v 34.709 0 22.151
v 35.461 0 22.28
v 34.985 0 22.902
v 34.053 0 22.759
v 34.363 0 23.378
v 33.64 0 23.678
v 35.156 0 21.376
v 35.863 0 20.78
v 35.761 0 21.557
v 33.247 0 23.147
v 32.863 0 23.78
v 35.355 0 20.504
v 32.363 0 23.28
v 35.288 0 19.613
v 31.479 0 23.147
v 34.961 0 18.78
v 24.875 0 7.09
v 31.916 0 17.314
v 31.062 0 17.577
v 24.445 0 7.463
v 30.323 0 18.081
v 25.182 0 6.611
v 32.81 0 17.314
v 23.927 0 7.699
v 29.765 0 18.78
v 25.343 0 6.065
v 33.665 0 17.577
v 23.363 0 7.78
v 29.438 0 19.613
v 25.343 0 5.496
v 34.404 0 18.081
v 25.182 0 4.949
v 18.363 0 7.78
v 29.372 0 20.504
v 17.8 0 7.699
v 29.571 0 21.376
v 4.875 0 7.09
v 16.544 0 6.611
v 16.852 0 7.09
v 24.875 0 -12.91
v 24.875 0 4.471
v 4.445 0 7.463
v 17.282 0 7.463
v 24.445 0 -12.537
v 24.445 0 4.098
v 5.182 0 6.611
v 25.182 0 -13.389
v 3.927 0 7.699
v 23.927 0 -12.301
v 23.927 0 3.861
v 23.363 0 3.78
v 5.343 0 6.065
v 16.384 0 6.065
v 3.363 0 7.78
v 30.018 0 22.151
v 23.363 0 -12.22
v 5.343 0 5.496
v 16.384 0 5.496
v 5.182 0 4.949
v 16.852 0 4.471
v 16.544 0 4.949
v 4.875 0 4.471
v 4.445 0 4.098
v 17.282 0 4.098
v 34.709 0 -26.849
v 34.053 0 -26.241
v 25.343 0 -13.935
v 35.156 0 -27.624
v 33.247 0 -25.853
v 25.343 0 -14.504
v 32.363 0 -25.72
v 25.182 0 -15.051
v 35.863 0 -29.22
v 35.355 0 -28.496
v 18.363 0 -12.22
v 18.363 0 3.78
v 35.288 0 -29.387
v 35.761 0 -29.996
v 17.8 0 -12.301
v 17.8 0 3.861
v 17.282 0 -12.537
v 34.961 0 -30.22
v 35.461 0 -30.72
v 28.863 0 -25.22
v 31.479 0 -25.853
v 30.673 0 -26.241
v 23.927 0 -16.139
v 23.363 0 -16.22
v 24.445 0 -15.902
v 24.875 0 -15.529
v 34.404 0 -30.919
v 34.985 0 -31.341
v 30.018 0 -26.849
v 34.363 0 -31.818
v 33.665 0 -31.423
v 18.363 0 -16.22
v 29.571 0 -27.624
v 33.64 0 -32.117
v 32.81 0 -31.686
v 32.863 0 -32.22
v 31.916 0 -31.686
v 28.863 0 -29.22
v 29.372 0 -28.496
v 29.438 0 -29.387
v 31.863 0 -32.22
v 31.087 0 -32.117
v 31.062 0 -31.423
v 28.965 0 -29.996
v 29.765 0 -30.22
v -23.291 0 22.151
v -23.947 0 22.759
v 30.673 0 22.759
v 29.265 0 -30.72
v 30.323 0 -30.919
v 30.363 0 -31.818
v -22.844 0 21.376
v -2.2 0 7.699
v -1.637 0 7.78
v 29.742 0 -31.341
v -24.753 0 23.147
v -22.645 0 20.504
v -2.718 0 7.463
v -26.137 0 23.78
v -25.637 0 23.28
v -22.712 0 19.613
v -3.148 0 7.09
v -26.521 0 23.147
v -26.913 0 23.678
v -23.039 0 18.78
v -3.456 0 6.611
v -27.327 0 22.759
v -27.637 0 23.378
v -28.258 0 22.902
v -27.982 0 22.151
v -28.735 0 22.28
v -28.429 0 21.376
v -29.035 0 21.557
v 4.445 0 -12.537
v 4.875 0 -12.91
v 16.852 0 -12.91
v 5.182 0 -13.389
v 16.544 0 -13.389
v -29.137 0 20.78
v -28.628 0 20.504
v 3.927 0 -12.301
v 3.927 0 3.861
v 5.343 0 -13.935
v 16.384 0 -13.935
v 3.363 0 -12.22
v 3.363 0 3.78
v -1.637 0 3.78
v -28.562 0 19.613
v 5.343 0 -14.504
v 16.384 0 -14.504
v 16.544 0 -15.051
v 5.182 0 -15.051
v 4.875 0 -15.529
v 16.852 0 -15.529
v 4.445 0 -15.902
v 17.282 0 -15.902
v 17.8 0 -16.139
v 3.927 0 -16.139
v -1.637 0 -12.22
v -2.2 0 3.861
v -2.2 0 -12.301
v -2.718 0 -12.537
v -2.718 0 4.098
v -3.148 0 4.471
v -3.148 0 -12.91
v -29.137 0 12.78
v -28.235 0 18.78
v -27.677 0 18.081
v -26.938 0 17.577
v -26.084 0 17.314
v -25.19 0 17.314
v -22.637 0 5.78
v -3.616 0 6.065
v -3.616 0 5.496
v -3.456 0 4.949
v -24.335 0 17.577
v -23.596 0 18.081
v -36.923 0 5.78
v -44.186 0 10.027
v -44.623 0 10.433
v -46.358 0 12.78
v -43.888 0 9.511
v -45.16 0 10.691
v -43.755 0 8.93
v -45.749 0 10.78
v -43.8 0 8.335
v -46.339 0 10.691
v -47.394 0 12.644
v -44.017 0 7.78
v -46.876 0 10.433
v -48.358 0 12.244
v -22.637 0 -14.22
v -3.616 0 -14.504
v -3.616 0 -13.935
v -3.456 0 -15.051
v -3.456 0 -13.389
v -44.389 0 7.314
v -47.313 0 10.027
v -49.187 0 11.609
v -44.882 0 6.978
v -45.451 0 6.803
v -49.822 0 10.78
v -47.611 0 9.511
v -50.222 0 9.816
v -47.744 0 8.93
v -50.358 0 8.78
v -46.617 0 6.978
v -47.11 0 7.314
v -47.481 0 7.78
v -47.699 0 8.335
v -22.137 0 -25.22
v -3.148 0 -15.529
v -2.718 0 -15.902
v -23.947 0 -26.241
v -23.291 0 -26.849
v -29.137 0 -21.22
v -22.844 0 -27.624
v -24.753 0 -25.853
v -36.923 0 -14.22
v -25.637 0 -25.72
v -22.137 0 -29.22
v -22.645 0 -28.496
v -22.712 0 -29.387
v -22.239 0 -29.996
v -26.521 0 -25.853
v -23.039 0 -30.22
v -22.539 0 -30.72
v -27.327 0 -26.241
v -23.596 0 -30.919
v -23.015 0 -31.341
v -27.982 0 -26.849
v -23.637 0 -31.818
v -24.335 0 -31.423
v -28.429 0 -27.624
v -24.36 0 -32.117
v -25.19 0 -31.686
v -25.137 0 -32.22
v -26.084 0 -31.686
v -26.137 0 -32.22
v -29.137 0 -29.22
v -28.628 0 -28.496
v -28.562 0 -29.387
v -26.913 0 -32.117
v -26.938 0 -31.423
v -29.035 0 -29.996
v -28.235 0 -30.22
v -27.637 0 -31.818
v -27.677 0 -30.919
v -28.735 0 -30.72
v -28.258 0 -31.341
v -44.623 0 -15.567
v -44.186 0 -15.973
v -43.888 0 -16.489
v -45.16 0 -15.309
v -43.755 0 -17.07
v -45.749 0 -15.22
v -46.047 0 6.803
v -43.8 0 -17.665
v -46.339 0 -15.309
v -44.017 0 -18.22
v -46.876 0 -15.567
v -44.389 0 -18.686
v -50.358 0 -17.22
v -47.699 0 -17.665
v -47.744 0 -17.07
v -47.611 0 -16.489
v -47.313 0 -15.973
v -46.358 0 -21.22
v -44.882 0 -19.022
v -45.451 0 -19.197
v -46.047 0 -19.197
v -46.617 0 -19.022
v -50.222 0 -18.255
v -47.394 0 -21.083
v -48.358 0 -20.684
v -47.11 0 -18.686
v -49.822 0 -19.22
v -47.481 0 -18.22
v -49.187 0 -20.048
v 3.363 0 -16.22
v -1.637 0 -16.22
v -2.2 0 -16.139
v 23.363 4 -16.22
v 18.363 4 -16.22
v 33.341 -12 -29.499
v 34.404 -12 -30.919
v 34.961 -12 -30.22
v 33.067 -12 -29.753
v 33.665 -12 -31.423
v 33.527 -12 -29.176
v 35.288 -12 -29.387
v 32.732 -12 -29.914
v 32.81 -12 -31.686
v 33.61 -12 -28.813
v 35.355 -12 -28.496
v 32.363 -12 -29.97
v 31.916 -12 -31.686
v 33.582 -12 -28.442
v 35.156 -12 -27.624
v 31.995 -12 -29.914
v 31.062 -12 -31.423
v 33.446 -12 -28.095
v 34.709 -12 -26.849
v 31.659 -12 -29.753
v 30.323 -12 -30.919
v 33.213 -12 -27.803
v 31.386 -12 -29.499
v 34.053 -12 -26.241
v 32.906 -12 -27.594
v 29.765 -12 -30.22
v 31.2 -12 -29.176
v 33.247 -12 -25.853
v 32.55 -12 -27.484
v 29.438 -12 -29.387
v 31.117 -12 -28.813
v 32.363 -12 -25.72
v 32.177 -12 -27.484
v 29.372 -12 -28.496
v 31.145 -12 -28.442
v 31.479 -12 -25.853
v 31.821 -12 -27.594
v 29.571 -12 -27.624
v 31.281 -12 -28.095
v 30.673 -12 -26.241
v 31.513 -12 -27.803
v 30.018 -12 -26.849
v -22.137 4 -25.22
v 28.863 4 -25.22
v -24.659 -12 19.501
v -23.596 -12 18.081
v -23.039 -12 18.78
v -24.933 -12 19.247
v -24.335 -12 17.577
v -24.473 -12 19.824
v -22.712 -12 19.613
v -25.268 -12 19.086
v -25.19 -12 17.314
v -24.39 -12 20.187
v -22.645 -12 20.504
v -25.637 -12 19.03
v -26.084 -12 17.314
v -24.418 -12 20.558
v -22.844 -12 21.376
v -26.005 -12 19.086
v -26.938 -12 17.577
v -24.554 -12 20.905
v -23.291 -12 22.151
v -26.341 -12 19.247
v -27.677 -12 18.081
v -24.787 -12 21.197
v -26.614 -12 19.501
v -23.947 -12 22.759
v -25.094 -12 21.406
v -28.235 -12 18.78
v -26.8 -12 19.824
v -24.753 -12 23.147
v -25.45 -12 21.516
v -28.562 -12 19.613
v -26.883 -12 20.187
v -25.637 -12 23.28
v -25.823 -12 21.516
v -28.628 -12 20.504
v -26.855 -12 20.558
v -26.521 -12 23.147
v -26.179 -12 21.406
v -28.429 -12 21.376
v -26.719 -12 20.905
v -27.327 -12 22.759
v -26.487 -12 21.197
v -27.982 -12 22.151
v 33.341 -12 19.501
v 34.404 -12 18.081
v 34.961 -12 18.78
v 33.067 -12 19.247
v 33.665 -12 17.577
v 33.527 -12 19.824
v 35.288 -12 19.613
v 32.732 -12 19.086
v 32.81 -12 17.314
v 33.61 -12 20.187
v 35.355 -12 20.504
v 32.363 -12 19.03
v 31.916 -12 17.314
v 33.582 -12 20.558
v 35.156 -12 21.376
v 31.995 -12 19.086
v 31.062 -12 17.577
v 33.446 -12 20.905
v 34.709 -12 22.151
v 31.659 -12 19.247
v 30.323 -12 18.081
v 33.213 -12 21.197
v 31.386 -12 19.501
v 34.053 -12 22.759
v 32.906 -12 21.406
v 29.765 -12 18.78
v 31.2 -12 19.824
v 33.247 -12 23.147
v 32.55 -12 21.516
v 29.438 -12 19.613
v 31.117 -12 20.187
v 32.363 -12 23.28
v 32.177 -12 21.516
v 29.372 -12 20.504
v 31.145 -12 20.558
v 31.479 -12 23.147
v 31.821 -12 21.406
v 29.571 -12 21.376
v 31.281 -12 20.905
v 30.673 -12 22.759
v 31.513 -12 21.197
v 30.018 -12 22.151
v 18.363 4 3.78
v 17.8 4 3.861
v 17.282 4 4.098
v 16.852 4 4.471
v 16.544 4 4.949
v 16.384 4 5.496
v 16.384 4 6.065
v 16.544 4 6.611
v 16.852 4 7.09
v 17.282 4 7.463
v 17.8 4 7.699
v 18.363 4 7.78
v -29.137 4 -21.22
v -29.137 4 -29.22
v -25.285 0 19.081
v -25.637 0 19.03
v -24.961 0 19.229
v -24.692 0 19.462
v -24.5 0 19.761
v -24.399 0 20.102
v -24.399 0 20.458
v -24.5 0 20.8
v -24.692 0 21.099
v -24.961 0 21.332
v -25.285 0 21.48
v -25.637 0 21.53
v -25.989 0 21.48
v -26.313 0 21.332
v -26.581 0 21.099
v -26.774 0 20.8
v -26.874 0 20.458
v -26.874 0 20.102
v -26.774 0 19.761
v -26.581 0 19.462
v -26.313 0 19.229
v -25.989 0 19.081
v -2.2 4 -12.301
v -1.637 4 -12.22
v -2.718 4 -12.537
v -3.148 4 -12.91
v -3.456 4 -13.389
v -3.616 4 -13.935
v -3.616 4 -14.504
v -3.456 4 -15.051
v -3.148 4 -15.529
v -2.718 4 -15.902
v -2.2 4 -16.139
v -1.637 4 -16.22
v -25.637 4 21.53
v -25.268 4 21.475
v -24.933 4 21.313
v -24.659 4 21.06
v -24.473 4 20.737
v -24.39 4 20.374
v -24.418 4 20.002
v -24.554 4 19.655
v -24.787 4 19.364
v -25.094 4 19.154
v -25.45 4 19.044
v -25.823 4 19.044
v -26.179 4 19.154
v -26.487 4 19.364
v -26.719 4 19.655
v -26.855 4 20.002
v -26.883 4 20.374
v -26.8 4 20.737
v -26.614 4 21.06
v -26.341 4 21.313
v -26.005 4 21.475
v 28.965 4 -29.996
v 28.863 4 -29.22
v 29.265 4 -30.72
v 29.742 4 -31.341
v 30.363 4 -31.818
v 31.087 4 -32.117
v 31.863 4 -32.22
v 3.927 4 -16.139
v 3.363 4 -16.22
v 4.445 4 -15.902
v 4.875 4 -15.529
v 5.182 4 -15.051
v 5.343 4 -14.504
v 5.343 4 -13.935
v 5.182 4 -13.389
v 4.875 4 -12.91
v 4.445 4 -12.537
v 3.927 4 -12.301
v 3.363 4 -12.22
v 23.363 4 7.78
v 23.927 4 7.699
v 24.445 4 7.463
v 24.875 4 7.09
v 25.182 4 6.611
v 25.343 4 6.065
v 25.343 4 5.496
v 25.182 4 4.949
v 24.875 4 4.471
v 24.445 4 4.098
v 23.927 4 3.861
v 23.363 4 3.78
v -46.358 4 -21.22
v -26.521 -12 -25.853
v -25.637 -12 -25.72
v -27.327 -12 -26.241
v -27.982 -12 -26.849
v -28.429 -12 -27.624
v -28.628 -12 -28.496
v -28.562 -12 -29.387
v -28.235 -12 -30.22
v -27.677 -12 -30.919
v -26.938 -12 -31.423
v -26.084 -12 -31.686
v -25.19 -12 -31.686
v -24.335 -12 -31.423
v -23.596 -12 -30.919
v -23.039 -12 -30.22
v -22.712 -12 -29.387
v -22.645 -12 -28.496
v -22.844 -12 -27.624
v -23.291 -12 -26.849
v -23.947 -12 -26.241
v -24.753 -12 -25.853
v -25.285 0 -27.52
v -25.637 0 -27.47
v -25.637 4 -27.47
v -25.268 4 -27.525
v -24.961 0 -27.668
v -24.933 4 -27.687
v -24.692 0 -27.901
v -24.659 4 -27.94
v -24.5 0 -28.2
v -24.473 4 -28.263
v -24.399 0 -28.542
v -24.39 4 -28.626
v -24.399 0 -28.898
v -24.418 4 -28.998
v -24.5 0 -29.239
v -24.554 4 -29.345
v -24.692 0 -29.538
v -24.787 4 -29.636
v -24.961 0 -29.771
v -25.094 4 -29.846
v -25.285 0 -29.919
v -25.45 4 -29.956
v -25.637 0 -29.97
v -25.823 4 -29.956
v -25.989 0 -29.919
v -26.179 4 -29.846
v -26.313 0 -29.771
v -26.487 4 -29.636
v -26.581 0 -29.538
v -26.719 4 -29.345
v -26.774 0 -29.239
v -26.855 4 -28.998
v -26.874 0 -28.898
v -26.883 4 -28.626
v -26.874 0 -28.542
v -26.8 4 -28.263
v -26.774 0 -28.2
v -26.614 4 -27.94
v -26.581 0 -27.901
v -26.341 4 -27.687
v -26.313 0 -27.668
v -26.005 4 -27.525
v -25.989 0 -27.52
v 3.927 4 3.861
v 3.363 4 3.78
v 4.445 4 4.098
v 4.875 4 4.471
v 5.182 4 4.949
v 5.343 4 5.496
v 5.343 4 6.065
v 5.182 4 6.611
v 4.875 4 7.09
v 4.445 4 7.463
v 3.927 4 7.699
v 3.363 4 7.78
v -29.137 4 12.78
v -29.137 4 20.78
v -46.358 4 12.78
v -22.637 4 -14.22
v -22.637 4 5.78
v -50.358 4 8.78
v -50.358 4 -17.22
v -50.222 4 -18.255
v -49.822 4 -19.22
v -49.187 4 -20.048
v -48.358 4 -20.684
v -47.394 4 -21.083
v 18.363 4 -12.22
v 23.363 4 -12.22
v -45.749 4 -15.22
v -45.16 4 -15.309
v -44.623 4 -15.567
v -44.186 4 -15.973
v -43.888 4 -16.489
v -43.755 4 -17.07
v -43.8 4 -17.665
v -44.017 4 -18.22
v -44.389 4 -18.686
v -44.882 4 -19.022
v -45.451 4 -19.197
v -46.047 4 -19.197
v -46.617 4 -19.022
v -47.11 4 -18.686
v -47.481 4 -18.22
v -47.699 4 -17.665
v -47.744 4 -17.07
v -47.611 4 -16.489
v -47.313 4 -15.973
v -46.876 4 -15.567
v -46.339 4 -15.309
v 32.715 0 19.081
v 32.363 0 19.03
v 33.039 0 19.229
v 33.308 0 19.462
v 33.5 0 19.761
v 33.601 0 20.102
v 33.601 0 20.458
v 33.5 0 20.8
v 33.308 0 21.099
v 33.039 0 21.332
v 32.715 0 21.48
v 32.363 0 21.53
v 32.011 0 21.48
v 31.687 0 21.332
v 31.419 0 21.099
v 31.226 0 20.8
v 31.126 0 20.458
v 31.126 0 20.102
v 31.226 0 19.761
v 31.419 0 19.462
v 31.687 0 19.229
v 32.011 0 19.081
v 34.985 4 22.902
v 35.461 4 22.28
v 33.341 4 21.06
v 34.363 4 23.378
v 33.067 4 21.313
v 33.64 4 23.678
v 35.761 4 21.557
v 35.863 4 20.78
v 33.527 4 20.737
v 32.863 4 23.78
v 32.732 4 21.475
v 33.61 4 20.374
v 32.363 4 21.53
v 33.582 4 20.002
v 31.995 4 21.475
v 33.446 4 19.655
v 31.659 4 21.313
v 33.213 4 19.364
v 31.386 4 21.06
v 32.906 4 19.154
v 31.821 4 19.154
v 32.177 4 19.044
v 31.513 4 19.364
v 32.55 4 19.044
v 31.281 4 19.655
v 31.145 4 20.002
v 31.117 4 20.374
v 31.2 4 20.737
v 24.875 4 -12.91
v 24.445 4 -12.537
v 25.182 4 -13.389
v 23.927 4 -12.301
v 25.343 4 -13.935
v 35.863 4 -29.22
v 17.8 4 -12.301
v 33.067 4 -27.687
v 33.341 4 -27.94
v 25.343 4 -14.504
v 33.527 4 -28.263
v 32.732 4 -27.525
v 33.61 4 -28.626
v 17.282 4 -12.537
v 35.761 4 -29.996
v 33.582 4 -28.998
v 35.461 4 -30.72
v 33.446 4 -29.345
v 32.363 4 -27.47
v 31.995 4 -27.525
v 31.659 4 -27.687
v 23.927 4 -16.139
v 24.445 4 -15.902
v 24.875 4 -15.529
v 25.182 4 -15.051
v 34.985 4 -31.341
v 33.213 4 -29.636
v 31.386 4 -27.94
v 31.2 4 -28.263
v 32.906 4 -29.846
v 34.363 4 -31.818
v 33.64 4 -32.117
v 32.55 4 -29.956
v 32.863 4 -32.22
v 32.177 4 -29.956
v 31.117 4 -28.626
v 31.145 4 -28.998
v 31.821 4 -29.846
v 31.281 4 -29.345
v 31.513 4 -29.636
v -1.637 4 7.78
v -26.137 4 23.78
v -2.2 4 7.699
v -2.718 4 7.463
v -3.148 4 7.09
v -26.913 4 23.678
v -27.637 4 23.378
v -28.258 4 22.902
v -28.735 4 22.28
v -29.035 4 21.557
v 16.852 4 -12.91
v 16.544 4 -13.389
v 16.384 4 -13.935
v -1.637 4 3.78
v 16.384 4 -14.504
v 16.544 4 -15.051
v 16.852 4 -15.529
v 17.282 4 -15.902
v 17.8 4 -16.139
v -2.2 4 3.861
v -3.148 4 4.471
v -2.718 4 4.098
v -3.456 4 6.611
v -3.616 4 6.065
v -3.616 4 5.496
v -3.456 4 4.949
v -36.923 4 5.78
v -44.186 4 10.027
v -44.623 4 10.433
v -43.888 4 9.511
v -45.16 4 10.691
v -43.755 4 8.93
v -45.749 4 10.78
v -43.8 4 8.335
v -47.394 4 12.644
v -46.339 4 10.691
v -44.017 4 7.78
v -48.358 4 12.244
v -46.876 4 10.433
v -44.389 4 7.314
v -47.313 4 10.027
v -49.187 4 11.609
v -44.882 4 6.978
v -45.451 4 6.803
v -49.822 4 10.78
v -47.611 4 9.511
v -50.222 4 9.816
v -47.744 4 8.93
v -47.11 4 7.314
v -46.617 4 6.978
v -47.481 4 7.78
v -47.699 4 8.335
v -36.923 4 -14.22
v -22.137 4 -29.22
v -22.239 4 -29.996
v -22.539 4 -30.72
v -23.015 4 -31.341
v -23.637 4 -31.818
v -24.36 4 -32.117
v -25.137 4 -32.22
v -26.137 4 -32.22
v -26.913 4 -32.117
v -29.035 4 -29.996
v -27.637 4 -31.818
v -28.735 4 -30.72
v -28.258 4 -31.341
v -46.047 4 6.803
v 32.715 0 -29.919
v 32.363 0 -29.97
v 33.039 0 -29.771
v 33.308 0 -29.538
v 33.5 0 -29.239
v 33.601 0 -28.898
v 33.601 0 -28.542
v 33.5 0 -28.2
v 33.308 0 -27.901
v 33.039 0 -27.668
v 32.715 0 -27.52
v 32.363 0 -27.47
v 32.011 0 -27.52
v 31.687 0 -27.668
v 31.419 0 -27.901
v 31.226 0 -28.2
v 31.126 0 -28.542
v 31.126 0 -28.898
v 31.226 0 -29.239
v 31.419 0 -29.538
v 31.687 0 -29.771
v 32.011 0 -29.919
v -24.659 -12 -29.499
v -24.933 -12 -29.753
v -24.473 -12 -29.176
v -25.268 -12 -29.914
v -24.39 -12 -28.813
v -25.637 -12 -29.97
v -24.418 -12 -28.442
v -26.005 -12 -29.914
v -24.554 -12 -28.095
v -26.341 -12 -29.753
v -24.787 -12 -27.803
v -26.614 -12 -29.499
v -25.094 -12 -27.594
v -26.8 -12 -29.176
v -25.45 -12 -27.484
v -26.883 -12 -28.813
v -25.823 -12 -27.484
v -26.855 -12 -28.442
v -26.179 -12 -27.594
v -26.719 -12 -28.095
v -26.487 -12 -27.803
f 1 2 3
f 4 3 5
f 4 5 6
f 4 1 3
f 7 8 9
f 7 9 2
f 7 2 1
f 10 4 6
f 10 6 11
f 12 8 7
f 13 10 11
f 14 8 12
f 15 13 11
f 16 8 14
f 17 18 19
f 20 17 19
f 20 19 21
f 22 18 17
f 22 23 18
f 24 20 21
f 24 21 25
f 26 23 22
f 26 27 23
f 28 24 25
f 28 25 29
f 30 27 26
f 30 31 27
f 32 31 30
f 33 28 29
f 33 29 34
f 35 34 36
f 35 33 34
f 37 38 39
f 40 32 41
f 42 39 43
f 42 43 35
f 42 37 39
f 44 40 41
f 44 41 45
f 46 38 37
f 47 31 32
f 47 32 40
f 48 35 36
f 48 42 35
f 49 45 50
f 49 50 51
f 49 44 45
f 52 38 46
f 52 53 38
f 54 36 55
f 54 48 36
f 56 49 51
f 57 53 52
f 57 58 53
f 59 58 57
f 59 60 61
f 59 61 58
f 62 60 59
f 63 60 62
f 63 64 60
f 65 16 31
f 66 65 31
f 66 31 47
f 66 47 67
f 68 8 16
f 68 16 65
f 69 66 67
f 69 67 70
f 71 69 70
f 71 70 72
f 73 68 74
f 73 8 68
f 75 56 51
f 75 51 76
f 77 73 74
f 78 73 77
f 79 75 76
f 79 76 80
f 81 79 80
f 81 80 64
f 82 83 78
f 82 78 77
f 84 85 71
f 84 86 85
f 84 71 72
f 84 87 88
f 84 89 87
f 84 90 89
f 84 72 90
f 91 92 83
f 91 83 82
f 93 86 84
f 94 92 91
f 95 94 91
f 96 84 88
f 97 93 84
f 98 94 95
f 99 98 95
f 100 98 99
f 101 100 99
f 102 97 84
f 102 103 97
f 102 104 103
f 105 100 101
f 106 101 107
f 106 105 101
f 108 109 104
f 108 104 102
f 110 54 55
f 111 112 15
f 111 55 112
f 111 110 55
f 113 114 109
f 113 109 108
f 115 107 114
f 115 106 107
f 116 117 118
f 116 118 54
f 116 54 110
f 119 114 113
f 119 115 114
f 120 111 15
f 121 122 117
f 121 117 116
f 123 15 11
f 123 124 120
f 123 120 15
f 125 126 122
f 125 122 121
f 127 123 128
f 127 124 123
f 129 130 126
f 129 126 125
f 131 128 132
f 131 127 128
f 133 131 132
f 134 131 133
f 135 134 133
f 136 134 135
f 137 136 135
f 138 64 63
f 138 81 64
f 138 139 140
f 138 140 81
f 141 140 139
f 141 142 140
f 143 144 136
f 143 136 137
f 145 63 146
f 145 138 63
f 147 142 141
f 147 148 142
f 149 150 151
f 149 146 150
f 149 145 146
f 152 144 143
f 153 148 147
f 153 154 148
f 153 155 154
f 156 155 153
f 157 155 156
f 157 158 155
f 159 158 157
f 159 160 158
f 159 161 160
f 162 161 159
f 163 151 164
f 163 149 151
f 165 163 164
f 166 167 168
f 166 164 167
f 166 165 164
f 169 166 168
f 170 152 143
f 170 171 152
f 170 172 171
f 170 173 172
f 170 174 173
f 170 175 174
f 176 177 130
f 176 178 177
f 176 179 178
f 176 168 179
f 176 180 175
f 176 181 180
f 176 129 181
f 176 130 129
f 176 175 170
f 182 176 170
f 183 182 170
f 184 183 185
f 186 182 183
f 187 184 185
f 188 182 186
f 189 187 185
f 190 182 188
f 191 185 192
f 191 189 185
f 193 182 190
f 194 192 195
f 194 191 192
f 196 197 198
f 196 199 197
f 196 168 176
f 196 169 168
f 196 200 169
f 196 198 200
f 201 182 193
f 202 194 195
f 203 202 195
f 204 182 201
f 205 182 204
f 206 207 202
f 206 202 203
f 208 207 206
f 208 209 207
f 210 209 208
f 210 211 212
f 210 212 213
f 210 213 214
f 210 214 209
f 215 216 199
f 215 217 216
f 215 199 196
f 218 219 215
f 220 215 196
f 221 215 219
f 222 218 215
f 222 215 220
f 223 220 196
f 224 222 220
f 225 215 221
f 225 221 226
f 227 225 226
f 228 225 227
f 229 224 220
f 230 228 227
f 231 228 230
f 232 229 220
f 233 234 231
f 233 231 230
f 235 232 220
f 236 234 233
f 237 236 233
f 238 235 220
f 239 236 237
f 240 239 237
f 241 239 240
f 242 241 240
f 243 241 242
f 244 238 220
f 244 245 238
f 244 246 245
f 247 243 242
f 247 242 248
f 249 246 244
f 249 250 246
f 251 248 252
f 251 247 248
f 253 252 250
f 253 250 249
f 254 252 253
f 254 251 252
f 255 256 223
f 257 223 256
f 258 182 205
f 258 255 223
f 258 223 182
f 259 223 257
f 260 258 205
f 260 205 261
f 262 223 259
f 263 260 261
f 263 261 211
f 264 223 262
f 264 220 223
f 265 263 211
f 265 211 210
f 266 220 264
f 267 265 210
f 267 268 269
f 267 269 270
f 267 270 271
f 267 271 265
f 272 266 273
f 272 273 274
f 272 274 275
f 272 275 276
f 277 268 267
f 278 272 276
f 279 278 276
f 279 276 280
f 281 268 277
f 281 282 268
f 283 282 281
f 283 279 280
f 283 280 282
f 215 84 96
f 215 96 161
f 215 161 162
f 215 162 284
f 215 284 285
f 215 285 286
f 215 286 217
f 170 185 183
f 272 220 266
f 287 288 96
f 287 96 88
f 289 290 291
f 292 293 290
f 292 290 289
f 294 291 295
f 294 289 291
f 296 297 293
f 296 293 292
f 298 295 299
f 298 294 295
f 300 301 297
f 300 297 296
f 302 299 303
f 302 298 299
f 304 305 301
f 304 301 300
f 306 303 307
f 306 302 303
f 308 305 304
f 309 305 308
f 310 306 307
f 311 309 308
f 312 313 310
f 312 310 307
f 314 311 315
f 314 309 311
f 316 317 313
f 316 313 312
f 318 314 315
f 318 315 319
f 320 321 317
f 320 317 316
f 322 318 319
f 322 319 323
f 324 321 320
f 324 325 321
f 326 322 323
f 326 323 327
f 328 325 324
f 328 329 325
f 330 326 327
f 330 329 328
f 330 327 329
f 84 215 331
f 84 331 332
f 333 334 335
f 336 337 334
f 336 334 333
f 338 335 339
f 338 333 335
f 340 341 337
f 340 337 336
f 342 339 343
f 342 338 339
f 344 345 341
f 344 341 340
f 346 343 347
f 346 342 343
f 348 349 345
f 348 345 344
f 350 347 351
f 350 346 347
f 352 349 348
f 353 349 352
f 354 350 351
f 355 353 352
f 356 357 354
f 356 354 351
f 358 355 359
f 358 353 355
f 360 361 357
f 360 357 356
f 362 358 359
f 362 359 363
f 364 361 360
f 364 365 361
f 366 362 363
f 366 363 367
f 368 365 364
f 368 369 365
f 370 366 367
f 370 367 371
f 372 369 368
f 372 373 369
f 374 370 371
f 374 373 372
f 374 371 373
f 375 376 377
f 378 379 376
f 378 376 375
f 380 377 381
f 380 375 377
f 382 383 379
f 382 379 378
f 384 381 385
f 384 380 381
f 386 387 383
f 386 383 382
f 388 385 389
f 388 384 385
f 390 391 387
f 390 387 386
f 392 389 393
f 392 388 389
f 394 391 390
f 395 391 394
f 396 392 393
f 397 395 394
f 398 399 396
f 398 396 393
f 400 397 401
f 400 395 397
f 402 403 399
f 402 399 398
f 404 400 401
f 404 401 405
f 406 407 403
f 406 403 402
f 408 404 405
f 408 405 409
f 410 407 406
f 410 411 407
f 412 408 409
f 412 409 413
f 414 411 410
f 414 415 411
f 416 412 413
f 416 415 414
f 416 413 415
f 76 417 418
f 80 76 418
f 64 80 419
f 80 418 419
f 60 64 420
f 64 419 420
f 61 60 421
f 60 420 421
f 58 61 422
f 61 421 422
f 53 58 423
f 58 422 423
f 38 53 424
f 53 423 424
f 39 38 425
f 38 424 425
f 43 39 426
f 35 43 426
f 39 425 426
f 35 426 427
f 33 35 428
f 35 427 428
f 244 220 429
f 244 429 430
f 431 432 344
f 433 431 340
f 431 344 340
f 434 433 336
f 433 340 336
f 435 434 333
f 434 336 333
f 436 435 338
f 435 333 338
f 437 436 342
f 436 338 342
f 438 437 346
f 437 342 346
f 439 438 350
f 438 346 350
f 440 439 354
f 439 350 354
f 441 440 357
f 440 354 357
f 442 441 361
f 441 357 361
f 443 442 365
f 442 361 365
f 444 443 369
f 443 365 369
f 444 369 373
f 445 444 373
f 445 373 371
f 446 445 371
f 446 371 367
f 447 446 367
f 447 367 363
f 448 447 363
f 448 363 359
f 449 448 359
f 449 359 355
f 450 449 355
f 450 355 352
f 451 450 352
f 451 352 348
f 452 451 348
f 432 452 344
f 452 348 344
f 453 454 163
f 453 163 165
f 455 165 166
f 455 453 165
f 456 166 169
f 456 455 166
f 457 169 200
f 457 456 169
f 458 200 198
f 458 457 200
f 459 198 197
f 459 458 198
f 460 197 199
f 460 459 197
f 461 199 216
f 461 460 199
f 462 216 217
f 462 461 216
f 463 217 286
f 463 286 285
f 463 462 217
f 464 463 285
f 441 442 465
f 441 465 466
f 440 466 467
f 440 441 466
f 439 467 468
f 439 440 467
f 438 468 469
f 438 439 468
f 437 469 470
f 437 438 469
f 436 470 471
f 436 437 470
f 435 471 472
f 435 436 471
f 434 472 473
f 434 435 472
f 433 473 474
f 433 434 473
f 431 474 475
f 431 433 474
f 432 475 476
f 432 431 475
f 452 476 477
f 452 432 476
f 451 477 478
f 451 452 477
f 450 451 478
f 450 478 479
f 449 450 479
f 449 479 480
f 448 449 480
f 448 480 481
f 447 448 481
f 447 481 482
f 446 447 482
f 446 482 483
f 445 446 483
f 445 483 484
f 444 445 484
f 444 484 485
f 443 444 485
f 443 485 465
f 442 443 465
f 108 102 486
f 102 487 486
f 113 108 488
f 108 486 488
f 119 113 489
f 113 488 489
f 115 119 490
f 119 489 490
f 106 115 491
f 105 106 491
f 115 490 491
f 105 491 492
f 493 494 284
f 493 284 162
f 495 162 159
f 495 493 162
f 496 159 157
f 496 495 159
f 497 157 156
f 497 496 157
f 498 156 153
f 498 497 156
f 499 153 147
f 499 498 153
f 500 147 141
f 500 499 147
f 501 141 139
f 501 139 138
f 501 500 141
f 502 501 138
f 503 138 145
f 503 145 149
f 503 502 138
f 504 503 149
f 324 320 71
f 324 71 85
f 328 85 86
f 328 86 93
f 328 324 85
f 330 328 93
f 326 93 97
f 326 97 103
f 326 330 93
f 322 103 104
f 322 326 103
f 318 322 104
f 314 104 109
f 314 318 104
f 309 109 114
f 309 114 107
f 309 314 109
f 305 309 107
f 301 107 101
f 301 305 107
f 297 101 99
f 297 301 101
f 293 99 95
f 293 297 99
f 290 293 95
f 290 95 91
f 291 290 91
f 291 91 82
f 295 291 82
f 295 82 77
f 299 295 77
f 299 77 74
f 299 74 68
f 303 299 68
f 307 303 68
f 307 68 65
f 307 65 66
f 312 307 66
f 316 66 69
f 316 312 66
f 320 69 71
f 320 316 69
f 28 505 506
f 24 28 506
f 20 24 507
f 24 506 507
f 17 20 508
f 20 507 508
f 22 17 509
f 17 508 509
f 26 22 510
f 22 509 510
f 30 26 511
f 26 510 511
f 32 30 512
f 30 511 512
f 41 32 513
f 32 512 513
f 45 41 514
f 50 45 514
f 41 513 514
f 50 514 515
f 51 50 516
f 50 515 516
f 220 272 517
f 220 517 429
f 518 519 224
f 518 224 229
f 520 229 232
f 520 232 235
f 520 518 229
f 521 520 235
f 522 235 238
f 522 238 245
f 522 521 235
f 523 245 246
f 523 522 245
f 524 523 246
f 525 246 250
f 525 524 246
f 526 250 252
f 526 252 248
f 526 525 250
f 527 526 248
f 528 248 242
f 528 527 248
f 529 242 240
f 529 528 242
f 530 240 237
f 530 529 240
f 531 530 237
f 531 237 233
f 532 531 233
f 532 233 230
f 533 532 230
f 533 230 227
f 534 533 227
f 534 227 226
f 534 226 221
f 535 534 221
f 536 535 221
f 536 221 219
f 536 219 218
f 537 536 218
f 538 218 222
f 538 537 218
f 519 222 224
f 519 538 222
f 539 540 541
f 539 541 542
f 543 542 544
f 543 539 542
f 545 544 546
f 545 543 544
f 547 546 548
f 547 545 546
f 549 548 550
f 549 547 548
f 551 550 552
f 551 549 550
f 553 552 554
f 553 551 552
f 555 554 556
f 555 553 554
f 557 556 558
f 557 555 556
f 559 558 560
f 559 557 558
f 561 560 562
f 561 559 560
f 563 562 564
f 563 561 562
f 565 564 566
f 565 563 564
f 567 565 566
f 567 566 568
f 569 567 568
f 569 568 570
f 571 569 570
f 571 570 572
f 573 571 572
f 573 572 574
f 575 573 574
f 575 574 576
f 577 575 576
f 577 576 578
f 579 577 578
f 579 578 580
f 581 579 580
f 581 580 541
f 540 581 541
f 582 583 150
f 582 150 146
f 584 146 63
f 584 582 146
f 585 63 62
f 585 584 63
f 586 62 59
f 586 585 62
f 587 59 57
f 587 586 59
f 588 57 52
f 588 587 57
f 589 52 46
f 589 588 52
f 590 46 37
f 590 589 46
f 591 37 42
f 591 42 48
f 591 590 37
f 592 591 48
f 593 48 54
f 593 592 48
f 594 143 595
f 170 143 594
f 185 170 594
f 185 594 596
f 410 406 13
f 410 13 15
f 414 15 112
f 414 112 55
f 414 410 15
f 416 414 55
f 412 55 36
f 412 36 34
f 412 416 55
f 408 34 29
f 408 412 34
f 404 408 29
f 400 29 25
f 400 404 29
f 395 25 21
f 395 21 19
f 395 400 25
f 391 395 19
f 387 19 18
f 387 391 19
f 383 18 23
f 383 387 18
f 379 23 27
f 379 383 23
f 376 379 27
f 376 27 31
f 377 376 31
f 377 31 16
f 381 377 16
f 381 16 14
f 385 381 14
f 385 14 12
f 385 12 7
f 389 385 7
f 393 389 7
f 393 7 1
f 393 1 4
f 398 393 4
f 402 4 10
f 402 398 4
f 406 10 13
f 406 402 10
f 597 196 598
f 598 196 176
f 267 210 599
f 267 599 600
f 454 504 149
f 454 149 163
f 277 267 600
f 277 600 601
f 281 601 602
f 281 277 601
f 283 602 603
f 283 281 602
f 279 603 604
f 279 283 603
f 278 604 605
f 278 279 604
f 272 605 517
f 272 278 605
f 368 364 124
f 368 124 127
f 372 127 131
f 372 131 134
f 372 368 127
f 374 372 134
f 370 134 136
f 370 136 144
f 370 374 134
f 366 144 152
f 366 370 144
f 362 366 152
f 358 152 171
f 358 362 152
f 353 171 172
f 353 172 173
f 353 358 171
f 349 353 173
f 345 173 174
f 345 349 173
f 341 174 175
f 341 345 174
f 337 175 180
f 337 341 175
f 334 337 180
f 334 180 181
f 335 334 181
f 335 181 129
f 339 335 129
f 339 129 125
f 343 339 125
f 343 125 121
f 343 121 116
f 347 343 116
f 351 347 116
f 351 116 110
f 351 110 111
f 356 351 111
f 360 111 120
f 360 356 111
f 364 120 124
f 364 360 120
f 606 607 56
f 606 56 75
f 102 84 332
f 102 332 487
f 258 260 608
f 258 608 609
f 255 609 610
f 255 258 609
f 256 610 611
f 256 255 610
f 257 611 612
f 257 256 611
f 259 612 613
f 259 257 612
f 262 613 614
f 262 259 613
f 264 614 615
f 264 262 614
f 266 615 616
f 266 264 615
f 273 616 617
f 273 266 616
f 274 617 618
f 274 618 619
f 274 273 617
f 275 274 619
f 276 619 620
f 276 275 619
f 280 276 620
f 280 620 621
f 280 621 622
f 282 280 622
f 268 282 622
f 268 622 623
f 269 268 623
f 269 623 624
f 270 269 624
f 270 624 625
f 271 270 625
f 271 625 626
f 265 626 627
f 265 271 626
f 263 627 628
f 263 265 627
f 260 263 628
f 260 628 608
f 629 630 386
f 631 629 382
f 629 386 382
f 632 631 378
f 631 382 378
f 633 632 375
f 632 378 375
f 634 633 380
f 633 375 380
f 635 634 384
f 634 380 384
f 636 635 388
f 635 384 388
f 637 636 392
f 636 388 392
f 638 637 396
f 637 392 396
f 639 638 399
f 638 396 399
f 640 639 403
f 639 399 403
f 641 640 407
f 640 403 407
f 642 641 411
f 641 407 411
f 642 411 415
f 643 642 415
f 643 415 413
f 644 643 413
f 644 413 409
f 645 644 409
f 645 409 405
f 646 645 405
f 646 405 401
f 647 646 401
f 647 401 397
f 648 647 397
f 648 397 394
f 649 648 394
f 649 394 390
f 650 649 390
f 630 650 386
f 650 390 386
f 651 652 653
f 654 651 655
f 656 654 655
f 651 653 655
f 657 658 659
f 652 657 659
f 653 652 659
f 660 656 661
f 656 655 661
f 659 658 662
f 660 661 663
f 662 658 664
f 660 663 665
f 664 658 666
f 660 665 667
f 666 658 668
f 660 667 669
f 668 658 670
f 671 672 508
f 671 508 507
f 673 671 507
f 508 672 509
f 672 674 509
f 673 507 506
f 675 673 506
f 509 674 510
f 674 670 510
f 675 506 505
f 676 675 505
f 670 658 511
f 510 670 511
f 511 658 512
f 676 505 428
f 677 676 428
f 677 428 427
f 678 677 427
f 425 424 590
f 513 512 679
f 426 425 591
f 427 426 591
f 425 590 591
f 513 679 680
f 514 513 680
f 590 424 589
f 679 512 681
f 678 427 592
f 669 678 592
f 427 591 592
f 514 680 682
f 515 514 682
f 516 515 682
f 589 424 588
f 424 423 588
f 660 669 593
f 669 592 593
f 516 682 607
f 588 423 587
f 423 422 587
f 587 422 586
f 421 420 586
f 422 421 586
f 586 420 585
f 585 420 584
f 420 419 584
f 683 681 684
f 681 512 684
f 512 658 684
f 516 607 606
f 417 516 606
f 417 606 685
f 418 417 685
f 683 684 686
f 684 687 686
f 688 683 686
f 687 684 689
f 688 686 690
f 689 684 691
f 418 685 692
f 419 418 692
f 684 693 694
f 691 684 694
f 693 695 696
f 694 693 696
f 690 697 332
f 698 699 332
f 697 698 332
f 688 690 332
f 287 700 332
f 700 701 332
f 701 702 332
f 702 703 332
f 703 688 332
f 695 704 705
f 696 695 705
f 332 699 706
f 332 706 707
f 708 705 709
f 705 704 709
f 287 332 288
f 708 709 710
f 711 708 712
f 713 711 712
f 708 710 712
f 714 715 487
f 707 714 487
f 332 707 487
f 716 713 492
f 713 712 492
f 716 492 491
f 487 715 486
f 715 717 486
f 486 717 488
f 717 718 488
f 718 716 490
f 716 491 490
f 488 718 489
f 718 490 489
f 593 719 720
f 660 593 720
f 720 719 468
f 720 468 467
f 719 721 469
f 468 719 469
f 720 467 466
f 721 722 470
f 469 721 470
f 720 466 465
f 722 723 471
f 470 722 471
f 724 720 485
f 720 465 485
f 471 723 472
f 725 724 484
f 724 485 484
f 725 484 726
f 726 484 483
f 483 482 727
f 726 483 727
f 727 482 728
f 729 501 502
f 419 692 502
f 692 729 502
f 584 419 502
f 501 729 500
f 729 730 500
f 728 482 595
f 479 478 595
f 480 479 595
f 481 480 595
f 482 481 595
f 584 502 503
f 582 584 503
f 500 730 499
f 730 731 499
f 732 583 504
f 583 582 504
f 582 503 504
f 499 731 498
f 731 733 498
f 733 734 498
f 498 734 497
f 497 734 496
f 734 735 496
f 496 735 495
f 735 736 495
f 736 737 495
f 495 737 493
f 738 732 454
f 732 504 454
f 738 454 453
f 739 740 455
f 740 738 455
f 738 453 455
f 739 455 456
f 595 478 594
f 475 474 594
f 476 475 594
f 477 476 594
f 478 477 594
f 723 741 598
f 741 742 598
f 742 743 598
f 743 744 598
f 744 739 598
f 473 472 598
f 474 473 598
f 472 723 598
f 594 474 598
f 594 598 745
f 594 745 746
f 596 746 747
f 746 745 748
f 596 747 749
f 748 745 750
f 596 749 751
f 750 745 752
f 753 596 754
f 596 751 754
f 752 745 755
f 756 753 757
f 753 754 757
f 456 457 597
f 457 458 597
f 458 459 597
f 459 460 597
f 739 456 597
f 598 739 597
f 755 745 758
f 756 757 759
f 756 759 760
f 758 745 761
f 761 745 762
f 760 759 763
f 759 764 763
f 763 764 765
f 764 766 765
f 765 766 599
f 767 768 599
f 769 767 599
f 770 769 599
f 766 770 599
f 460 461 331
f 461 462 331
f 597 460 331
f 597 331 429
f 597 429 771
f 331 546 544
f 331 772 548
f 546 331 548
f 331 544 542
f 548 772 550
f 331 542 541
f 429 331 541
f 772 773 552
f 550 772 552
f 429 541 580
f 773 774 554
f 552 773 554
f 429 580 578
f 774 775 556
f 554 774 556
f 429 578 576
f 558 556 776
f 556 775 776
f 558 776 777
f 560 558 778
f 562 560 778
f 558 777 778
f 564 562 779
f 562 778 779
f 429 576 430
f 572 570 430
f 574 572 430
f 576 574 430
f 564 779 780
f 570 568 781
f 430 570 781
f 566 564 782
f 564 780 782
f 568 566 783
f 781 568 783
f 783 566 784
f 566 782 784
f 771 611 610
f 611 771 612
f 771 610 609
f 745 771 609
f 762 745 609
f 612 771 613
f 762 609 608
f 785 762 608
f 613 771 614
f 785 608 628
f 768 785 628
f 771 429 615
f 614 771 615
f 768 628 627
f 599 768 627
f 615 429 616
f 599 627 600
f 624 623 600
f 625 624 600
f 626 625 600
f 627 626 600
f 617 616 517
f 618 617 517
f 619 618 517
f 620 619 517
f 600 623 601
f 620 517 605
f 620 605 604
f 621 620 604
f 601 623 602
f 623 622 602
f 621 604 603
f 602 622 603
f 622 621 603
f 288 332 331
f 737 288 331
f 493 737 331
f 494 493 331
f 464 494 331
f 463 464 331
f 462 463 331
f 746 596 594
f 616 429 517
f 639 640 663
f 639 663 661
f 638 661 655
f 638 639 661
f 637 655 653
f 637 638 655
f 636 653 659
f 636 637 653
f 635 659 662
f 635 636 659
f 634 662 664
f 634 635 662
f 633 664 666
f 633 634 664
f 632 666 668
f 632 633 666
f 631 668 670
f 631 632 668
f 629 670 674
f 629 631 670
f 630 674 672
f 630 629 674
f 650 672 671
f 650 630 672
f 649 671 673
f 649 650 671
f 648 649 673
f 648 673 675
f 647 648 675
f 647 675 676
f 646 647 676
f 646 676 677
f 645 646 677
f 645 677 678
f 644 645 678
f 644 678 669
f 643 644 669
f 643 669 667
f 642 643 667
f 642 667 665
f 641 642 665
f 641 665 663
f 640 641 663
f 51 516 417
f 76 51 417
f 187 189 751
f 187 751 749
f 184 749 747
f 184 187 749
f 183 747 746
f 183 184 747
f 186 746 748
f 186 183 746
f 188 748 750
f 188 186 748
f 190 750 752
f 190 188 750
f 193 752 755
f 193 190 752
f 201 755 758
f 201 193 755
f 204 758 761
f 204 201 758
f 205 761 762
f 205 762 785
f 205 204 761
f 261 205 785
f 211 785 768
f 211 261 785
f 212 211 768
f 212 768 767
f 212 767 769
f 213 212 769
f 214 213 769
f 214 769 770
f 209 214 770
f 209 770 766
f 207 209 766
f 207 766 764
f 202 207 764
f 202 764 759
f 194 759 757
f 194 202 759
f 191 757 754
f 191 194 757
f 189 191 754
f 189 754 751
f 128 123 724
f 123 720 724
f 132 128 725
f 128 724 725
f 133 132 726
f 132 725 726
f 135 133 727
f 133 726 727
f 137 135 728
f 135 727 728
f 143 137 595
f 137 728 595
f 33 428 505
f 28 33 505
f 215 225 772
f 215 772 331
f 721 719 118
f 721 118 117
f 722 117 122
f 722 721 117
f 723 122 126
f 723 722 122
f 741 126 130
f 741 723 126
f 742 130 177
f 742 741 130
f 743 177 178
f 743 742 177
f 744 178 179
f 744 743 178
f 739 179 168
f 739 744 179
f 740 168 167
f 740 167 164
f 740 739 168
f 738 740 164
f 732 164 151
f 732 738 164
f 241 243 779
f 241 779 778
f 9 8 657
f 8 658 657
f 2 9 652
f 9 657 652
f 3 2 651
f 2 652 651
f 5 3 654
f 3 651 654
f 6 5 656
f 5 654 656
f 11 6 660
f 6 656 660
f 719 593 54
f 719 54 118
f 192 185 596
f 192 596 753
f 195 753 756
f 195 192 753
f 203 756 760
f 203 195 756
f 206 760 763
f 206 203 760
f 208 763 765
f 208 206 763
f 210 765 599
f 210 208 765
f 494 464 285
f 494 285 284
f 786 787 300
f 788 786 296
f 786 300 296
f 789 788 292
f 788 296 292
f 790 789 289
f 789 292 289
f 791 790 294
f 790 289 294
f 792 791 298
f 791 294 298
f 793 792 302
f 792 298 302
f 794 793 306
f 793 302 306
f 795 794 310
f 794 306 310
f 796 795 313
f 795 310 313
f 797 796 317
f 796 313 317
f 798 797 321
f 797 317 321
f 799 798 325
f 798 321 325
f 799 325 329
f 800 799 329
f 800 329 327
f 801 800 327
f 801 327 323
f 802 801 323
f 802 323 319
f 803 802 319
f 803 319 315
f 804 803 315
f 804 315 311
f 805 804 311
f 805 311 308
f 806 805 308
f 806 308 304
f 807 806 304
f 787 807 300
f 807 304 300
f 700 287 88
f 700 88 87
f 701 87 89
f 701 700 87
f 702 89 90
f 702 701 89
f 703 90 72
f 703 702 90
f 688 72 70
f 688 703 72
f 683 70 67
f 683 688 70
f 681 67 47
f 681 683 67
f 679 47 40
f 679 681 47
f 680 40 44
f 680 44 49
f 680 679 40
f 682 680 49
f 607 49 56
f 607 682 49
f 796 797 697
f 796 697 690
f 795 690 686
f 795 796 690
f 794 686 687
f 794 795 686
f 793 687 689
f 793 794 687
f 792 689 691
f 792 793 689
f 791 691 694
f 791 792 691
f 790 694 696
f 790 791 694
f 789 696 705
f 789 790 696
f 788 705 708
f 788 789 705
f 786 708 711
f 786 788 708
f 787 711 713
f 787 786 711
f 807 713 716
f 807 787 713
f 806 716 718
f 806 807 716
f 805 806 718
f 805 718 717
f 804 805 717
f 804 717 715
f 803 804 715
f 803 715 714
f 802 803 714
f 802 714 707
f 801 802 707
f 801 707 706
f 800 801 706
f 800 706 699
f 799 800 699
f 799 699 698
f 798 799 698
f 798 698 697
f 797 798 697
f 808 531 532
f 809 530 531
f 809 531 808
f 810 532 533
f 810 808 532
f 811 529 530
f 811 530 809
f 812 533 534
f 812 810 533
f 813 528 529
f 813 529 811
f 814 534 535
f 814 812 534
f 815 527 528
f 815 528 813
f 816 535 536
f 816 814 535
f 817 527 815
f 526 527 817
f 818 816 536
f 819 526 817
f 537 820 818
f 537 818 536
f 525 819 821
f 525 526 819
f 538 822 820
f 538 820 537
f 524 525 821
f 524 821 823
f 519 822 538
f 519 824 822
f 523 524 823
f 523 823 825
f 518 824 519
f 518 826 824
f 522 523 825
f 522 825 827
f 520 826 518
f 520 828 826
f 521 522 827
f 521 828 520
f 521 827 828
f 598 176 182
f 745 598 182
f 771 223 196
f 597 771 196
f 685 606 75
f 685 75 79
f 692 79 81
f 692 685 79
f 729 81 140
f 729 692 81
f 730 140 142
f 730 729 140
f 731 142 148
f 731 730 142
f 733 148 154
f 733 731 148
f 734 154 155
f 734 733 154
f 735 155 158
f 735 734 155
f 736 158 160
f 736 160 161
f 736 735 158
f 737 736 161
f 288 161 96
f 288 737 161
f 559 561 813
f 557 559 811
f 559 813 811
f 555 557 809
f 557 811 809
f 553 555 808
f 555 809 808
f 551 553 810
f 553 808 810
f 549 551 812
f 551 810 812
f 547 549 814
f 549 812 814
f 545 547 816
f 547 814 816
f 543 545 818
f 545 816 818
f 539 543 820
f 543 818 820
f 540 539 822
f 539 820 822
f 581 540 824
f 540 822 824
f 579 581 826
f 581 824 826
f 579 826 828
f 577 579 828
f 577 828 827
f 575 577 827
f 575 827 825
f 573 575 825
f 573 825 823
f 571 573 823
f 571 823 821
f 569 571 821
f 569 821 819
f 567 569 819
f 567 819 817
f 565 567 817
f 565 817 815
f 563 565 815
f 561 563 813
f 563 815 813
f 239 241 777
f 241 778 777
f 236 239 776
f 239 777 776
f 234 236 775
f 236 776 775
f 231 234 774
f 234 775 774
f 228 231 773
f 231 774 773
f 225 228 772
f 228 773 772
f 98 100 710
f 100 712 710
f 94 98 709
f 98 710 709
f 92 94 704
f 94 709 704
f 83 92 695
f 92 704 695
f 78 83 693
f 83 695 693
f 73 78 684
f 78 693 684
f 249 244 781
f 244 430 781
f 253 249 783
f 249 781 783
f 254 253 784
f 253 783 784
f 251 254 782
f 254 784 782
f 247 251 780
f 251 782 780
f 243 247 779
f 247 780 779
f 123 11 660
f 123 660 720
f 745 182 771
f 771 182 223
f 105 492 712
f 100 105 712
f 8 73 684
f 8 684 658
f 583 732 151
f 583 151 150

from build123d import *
from build123d.topology import SkipClean

# Parameters (mm, degrees)
SKETCH1_R           = 1.25
SKETCH1_R_2         = 2
BOSS_EXTRUDE1_DEPTH = 4
FILLET1_R           = 3
CUT_EXTRUDE1_DEPTH  = 4
BOSS_EXTRUDE2_START = 12
SKETCH3_R           = 3
SKETCH3_R_2         = 1.25
BOSS_EXTRUDE2_DEPTH = 12


with BuildPart() as part:
    # Sketch1 → Boss-Extrude1 (new body)
    with BuildSketch(Plane(origin=(0, 0, 0), x_dir=(1, 0, 0), z_dir=(0, 1, 0))):
        with BuildLine():
            Line((-29.136771411, 21.21972047), (-29.136771411, 32.21972047))
            Line((-29.136771411, 32.21972047), (-22.136771411, 32.21972047))
            Line((-22.136771411, 32.21972047), (-22.136771411, 25.21972047))
            Line((-22.136771411, 25.21972047), (28.863228589, 25.21972047))
            Line((28.863228589, 25.21972047), (28.863228589, 32.21972047))
            Line((28.863228589, 32.21972047), (35.863228589, 32.21972047))
            Line((35.863228589, 32.21972047), (35.863228589, -23.78027953))
            Line((35.863228589, -23.78027953), (-29.136771411, -23.78027953))
            Line((-29.136771411, -23.78027953), (-29.136771411, -12.78027953))
            Line((-29.136771411, -12.78027953), (-46.358384932, -12.78027953))
            ThreePointArc((-46.358384932, -12.78027953), (-49.186812057, -11.608706655), (-50.358384932, -8.78027953))
            Line((-50.358384932, -8.78027953), (-50.358384932, 17.21972047))
            ThreePointArc((-50.358384932, 17.21972047), (-49.186812057, 20.048147594), (-46.358384932, 21.21972047))
            Line((-46.358384932, 21.21972047), (-29.136771411, 21.21972047))
        make_face()
        with Locations(Location((32.363228589, 28.71972047, 0), (0, 0, 270))):
            Circle(SKETCH1_R, mode=Mode.SUBTRACT)
        with Locations(Location((-25.636771411, 28.71972047, 0), (0, 0, 270))):
            Circle(SKETCH1_R, mode=Mode.SUBTRACT)
        with Locations(Location((32.363228589, -20.28027953, 0), (0, 0, 270))):
            Circle(SKETCH1_R, mode=Mode.SUBTRACT)
        with Locations(Location((-25.636771411, -20.28027953, 0), (0, 0, 270))):
            Circle(SKETCH1_R, mode=Mode.SUBTRACT)
        with Locations(Location((-45.749381244, 17.21972047, 0), (0, 0, 270))):
            Circle(SKETCH1_R_2, mode=Mode.SUBTRACT)
        with Locations(Location((-45.749381244, -8.78027953, 0), (0, 0, 270))):
            Circle(SKETCH1_R_2, mode=Mode.SUBTRACT)
        Polygon((-29.136771411, 14.21972047), (-22.636771411, 14.21972047), (-22.636771411, -5.78027953), (-29.136771411, -5.78027953), (-36.923074247, -5.78027953), (-36.923074247, 14.21972047), align=None, mode=Mode.SUBTRACT)
    extrude(amount=BOSS_EXTRUDE1_DEPTH)

    # Fillet1
    fillet1_edges = [part.edges().sort_by_distance(p)[0] for p in [
        (-22.136771411, 2, -32.21972047),
        (28.863228589, 2, -32.21972047),
        (35.863228589, 2, -32.21972047),
        (35.863228589, 2, 23.78027953),
        (-29.136771411, 2, 23.78027953),
        (-29.136771411, 2, -32.21972047),
    ]]
    fillet(fillet1_edges, radius=FILLET1_R)

    # Sketch2 → Cut-Extrude1 (cut)
    with BuildSketch(Plane(origin=(0, 4, 0), x_dir=(1, 0, 0), z_dir=(0, 1, 0))):
        with BuildLine():
            Line((-1.636771411, 16.21972047), (3.363228589, 16.21972047))
            ThreePointArc((3.363228589, 16.21972047), (5.363228589, 14.21972047), (3.363228589, 12.21972047))
            Line((3.363228589, 12.21972047), (-1.636771411, 12.21972047))
            ThreePointArc((-1.636771411, 12.21972047), (-3.636771411, 14.21972047), (-1.636771411, 16.21972047))
        make_face()
        with BuildLine():
            Line((18.363228589, 16.21972047), (23.363228589, 16.21972047))
            ThreePointArc((23.363228589, 16.21972047), (25.363228589, 14.21972047), (23.363228589, 12.21972047))
            Line((23.363228589, 12.21972047), (18.363228589, 12.21972047))
            ThreePointArc((18.363228589, 12.21972047), (16.363228589, 14.21972047), (18.363228589, 16.21972047))
        make_face()
        with BuildLine():
            Line((23.363228589, -3.78027953), (18.363228589, -3.78027953))
            ThreePointArc((18.363228589, -3.78027953), (16.363228589, -5.78027953), (18.363228589, -7.78027953))
            Line((18.363228589, -7.78027953), (23.363228589, -7.78027953))
            ThreePointArc((23.363228589, -7.78027953), (25.363228589, -5.78027953), (23.363228589, -3.78027953))
        make_face()
        with BuildLine():
            Line((-1.636771411, -3.78027953), (3.363228589, -3.78027953))
            ThreePointArc((3.363228589, -3.78027953), (5.363228589, -5.78027953), (3.363228589, -7.78027953))
            Line((3.363228589, -7.78027953), (-1.636771411, -7.78027953))
            ThreePointArc((-1.636771411, -7.78027953), (-3.636771411, -5.78027953), (-1.636771411, -3.78027953))
        make_face()
    extrude(amount=-CUT_EXTRUDE1_DEPTH, mode=Mode.SUBTRACT)

    # Sketch3 → Boss-Extrude2 (add)
    # profile 1 of 4: a face of its own
    with SkipClean():  # the faces are left unmerged after this step: merging them gives an invalid solid
        with BuildSketch(Plane.XZ.offset(BOSS_EXTRUDE2_START)):
            with Locations(Location((-25.636771411, 20.28027953, 0), (0, 0, 90))):
                Circle(SKETCH3_R)
            with Locations(Location((-25.636771411, 20.28027953, 0), (0, 0, 270))):
                Circle(SKETCH3_R_2, mode=Mode.SUBTRACT)
        # profile 2 of 4: a face of its own
        with BuildSketch(Plane.XZ.offset(BOSS_EXTRUDE2_START)):
            with Locations(Location((-25.636771411, -28.71972047, 0), (0, 0, 90))):
                Circle(SKETCH3_R)
            with Locations(Location((-25.636771411, -28.71972047, 0), (0, 0, 270))):
                Circle(SKETCH3_R_2, mode=Mode.SUBTRACT)
        # profile 3 of 4: a face of its own
        with BuildSketch(Plane.XZ.offset(BOSS_EXTRUDE2_START)):
            with Locations(Location((32.363228589, -28.71972047, 0), (0, 0, 90))):
                Circle(SKETCH3_R)
            with Locations(Location((32.363228589, -28.71972047, 0), (0, 0, 270))):
                Circle(SKETCH3_R_2, mode=Mode.SUBTRACT)
        # profile 4 of 4: a face of its own
        with BuildSketch(Plane.XZ.offset(BOSS_EXTRUDE2_START)):
            with Locations(Location((32.363228589, 20.28027953, 0), (0, 0, 90))):
                Circle(SKETCH3_R)
            with Locations(Location((32.363228589, 20.28027953, 0), (0, 0, 270))):
                Circle(SKETCH3_R_2, mode=Mode.SUBTRACT)
        extrude(amount=-BOSS_EXTRUDE2_DEPTH)


solid = part.part
